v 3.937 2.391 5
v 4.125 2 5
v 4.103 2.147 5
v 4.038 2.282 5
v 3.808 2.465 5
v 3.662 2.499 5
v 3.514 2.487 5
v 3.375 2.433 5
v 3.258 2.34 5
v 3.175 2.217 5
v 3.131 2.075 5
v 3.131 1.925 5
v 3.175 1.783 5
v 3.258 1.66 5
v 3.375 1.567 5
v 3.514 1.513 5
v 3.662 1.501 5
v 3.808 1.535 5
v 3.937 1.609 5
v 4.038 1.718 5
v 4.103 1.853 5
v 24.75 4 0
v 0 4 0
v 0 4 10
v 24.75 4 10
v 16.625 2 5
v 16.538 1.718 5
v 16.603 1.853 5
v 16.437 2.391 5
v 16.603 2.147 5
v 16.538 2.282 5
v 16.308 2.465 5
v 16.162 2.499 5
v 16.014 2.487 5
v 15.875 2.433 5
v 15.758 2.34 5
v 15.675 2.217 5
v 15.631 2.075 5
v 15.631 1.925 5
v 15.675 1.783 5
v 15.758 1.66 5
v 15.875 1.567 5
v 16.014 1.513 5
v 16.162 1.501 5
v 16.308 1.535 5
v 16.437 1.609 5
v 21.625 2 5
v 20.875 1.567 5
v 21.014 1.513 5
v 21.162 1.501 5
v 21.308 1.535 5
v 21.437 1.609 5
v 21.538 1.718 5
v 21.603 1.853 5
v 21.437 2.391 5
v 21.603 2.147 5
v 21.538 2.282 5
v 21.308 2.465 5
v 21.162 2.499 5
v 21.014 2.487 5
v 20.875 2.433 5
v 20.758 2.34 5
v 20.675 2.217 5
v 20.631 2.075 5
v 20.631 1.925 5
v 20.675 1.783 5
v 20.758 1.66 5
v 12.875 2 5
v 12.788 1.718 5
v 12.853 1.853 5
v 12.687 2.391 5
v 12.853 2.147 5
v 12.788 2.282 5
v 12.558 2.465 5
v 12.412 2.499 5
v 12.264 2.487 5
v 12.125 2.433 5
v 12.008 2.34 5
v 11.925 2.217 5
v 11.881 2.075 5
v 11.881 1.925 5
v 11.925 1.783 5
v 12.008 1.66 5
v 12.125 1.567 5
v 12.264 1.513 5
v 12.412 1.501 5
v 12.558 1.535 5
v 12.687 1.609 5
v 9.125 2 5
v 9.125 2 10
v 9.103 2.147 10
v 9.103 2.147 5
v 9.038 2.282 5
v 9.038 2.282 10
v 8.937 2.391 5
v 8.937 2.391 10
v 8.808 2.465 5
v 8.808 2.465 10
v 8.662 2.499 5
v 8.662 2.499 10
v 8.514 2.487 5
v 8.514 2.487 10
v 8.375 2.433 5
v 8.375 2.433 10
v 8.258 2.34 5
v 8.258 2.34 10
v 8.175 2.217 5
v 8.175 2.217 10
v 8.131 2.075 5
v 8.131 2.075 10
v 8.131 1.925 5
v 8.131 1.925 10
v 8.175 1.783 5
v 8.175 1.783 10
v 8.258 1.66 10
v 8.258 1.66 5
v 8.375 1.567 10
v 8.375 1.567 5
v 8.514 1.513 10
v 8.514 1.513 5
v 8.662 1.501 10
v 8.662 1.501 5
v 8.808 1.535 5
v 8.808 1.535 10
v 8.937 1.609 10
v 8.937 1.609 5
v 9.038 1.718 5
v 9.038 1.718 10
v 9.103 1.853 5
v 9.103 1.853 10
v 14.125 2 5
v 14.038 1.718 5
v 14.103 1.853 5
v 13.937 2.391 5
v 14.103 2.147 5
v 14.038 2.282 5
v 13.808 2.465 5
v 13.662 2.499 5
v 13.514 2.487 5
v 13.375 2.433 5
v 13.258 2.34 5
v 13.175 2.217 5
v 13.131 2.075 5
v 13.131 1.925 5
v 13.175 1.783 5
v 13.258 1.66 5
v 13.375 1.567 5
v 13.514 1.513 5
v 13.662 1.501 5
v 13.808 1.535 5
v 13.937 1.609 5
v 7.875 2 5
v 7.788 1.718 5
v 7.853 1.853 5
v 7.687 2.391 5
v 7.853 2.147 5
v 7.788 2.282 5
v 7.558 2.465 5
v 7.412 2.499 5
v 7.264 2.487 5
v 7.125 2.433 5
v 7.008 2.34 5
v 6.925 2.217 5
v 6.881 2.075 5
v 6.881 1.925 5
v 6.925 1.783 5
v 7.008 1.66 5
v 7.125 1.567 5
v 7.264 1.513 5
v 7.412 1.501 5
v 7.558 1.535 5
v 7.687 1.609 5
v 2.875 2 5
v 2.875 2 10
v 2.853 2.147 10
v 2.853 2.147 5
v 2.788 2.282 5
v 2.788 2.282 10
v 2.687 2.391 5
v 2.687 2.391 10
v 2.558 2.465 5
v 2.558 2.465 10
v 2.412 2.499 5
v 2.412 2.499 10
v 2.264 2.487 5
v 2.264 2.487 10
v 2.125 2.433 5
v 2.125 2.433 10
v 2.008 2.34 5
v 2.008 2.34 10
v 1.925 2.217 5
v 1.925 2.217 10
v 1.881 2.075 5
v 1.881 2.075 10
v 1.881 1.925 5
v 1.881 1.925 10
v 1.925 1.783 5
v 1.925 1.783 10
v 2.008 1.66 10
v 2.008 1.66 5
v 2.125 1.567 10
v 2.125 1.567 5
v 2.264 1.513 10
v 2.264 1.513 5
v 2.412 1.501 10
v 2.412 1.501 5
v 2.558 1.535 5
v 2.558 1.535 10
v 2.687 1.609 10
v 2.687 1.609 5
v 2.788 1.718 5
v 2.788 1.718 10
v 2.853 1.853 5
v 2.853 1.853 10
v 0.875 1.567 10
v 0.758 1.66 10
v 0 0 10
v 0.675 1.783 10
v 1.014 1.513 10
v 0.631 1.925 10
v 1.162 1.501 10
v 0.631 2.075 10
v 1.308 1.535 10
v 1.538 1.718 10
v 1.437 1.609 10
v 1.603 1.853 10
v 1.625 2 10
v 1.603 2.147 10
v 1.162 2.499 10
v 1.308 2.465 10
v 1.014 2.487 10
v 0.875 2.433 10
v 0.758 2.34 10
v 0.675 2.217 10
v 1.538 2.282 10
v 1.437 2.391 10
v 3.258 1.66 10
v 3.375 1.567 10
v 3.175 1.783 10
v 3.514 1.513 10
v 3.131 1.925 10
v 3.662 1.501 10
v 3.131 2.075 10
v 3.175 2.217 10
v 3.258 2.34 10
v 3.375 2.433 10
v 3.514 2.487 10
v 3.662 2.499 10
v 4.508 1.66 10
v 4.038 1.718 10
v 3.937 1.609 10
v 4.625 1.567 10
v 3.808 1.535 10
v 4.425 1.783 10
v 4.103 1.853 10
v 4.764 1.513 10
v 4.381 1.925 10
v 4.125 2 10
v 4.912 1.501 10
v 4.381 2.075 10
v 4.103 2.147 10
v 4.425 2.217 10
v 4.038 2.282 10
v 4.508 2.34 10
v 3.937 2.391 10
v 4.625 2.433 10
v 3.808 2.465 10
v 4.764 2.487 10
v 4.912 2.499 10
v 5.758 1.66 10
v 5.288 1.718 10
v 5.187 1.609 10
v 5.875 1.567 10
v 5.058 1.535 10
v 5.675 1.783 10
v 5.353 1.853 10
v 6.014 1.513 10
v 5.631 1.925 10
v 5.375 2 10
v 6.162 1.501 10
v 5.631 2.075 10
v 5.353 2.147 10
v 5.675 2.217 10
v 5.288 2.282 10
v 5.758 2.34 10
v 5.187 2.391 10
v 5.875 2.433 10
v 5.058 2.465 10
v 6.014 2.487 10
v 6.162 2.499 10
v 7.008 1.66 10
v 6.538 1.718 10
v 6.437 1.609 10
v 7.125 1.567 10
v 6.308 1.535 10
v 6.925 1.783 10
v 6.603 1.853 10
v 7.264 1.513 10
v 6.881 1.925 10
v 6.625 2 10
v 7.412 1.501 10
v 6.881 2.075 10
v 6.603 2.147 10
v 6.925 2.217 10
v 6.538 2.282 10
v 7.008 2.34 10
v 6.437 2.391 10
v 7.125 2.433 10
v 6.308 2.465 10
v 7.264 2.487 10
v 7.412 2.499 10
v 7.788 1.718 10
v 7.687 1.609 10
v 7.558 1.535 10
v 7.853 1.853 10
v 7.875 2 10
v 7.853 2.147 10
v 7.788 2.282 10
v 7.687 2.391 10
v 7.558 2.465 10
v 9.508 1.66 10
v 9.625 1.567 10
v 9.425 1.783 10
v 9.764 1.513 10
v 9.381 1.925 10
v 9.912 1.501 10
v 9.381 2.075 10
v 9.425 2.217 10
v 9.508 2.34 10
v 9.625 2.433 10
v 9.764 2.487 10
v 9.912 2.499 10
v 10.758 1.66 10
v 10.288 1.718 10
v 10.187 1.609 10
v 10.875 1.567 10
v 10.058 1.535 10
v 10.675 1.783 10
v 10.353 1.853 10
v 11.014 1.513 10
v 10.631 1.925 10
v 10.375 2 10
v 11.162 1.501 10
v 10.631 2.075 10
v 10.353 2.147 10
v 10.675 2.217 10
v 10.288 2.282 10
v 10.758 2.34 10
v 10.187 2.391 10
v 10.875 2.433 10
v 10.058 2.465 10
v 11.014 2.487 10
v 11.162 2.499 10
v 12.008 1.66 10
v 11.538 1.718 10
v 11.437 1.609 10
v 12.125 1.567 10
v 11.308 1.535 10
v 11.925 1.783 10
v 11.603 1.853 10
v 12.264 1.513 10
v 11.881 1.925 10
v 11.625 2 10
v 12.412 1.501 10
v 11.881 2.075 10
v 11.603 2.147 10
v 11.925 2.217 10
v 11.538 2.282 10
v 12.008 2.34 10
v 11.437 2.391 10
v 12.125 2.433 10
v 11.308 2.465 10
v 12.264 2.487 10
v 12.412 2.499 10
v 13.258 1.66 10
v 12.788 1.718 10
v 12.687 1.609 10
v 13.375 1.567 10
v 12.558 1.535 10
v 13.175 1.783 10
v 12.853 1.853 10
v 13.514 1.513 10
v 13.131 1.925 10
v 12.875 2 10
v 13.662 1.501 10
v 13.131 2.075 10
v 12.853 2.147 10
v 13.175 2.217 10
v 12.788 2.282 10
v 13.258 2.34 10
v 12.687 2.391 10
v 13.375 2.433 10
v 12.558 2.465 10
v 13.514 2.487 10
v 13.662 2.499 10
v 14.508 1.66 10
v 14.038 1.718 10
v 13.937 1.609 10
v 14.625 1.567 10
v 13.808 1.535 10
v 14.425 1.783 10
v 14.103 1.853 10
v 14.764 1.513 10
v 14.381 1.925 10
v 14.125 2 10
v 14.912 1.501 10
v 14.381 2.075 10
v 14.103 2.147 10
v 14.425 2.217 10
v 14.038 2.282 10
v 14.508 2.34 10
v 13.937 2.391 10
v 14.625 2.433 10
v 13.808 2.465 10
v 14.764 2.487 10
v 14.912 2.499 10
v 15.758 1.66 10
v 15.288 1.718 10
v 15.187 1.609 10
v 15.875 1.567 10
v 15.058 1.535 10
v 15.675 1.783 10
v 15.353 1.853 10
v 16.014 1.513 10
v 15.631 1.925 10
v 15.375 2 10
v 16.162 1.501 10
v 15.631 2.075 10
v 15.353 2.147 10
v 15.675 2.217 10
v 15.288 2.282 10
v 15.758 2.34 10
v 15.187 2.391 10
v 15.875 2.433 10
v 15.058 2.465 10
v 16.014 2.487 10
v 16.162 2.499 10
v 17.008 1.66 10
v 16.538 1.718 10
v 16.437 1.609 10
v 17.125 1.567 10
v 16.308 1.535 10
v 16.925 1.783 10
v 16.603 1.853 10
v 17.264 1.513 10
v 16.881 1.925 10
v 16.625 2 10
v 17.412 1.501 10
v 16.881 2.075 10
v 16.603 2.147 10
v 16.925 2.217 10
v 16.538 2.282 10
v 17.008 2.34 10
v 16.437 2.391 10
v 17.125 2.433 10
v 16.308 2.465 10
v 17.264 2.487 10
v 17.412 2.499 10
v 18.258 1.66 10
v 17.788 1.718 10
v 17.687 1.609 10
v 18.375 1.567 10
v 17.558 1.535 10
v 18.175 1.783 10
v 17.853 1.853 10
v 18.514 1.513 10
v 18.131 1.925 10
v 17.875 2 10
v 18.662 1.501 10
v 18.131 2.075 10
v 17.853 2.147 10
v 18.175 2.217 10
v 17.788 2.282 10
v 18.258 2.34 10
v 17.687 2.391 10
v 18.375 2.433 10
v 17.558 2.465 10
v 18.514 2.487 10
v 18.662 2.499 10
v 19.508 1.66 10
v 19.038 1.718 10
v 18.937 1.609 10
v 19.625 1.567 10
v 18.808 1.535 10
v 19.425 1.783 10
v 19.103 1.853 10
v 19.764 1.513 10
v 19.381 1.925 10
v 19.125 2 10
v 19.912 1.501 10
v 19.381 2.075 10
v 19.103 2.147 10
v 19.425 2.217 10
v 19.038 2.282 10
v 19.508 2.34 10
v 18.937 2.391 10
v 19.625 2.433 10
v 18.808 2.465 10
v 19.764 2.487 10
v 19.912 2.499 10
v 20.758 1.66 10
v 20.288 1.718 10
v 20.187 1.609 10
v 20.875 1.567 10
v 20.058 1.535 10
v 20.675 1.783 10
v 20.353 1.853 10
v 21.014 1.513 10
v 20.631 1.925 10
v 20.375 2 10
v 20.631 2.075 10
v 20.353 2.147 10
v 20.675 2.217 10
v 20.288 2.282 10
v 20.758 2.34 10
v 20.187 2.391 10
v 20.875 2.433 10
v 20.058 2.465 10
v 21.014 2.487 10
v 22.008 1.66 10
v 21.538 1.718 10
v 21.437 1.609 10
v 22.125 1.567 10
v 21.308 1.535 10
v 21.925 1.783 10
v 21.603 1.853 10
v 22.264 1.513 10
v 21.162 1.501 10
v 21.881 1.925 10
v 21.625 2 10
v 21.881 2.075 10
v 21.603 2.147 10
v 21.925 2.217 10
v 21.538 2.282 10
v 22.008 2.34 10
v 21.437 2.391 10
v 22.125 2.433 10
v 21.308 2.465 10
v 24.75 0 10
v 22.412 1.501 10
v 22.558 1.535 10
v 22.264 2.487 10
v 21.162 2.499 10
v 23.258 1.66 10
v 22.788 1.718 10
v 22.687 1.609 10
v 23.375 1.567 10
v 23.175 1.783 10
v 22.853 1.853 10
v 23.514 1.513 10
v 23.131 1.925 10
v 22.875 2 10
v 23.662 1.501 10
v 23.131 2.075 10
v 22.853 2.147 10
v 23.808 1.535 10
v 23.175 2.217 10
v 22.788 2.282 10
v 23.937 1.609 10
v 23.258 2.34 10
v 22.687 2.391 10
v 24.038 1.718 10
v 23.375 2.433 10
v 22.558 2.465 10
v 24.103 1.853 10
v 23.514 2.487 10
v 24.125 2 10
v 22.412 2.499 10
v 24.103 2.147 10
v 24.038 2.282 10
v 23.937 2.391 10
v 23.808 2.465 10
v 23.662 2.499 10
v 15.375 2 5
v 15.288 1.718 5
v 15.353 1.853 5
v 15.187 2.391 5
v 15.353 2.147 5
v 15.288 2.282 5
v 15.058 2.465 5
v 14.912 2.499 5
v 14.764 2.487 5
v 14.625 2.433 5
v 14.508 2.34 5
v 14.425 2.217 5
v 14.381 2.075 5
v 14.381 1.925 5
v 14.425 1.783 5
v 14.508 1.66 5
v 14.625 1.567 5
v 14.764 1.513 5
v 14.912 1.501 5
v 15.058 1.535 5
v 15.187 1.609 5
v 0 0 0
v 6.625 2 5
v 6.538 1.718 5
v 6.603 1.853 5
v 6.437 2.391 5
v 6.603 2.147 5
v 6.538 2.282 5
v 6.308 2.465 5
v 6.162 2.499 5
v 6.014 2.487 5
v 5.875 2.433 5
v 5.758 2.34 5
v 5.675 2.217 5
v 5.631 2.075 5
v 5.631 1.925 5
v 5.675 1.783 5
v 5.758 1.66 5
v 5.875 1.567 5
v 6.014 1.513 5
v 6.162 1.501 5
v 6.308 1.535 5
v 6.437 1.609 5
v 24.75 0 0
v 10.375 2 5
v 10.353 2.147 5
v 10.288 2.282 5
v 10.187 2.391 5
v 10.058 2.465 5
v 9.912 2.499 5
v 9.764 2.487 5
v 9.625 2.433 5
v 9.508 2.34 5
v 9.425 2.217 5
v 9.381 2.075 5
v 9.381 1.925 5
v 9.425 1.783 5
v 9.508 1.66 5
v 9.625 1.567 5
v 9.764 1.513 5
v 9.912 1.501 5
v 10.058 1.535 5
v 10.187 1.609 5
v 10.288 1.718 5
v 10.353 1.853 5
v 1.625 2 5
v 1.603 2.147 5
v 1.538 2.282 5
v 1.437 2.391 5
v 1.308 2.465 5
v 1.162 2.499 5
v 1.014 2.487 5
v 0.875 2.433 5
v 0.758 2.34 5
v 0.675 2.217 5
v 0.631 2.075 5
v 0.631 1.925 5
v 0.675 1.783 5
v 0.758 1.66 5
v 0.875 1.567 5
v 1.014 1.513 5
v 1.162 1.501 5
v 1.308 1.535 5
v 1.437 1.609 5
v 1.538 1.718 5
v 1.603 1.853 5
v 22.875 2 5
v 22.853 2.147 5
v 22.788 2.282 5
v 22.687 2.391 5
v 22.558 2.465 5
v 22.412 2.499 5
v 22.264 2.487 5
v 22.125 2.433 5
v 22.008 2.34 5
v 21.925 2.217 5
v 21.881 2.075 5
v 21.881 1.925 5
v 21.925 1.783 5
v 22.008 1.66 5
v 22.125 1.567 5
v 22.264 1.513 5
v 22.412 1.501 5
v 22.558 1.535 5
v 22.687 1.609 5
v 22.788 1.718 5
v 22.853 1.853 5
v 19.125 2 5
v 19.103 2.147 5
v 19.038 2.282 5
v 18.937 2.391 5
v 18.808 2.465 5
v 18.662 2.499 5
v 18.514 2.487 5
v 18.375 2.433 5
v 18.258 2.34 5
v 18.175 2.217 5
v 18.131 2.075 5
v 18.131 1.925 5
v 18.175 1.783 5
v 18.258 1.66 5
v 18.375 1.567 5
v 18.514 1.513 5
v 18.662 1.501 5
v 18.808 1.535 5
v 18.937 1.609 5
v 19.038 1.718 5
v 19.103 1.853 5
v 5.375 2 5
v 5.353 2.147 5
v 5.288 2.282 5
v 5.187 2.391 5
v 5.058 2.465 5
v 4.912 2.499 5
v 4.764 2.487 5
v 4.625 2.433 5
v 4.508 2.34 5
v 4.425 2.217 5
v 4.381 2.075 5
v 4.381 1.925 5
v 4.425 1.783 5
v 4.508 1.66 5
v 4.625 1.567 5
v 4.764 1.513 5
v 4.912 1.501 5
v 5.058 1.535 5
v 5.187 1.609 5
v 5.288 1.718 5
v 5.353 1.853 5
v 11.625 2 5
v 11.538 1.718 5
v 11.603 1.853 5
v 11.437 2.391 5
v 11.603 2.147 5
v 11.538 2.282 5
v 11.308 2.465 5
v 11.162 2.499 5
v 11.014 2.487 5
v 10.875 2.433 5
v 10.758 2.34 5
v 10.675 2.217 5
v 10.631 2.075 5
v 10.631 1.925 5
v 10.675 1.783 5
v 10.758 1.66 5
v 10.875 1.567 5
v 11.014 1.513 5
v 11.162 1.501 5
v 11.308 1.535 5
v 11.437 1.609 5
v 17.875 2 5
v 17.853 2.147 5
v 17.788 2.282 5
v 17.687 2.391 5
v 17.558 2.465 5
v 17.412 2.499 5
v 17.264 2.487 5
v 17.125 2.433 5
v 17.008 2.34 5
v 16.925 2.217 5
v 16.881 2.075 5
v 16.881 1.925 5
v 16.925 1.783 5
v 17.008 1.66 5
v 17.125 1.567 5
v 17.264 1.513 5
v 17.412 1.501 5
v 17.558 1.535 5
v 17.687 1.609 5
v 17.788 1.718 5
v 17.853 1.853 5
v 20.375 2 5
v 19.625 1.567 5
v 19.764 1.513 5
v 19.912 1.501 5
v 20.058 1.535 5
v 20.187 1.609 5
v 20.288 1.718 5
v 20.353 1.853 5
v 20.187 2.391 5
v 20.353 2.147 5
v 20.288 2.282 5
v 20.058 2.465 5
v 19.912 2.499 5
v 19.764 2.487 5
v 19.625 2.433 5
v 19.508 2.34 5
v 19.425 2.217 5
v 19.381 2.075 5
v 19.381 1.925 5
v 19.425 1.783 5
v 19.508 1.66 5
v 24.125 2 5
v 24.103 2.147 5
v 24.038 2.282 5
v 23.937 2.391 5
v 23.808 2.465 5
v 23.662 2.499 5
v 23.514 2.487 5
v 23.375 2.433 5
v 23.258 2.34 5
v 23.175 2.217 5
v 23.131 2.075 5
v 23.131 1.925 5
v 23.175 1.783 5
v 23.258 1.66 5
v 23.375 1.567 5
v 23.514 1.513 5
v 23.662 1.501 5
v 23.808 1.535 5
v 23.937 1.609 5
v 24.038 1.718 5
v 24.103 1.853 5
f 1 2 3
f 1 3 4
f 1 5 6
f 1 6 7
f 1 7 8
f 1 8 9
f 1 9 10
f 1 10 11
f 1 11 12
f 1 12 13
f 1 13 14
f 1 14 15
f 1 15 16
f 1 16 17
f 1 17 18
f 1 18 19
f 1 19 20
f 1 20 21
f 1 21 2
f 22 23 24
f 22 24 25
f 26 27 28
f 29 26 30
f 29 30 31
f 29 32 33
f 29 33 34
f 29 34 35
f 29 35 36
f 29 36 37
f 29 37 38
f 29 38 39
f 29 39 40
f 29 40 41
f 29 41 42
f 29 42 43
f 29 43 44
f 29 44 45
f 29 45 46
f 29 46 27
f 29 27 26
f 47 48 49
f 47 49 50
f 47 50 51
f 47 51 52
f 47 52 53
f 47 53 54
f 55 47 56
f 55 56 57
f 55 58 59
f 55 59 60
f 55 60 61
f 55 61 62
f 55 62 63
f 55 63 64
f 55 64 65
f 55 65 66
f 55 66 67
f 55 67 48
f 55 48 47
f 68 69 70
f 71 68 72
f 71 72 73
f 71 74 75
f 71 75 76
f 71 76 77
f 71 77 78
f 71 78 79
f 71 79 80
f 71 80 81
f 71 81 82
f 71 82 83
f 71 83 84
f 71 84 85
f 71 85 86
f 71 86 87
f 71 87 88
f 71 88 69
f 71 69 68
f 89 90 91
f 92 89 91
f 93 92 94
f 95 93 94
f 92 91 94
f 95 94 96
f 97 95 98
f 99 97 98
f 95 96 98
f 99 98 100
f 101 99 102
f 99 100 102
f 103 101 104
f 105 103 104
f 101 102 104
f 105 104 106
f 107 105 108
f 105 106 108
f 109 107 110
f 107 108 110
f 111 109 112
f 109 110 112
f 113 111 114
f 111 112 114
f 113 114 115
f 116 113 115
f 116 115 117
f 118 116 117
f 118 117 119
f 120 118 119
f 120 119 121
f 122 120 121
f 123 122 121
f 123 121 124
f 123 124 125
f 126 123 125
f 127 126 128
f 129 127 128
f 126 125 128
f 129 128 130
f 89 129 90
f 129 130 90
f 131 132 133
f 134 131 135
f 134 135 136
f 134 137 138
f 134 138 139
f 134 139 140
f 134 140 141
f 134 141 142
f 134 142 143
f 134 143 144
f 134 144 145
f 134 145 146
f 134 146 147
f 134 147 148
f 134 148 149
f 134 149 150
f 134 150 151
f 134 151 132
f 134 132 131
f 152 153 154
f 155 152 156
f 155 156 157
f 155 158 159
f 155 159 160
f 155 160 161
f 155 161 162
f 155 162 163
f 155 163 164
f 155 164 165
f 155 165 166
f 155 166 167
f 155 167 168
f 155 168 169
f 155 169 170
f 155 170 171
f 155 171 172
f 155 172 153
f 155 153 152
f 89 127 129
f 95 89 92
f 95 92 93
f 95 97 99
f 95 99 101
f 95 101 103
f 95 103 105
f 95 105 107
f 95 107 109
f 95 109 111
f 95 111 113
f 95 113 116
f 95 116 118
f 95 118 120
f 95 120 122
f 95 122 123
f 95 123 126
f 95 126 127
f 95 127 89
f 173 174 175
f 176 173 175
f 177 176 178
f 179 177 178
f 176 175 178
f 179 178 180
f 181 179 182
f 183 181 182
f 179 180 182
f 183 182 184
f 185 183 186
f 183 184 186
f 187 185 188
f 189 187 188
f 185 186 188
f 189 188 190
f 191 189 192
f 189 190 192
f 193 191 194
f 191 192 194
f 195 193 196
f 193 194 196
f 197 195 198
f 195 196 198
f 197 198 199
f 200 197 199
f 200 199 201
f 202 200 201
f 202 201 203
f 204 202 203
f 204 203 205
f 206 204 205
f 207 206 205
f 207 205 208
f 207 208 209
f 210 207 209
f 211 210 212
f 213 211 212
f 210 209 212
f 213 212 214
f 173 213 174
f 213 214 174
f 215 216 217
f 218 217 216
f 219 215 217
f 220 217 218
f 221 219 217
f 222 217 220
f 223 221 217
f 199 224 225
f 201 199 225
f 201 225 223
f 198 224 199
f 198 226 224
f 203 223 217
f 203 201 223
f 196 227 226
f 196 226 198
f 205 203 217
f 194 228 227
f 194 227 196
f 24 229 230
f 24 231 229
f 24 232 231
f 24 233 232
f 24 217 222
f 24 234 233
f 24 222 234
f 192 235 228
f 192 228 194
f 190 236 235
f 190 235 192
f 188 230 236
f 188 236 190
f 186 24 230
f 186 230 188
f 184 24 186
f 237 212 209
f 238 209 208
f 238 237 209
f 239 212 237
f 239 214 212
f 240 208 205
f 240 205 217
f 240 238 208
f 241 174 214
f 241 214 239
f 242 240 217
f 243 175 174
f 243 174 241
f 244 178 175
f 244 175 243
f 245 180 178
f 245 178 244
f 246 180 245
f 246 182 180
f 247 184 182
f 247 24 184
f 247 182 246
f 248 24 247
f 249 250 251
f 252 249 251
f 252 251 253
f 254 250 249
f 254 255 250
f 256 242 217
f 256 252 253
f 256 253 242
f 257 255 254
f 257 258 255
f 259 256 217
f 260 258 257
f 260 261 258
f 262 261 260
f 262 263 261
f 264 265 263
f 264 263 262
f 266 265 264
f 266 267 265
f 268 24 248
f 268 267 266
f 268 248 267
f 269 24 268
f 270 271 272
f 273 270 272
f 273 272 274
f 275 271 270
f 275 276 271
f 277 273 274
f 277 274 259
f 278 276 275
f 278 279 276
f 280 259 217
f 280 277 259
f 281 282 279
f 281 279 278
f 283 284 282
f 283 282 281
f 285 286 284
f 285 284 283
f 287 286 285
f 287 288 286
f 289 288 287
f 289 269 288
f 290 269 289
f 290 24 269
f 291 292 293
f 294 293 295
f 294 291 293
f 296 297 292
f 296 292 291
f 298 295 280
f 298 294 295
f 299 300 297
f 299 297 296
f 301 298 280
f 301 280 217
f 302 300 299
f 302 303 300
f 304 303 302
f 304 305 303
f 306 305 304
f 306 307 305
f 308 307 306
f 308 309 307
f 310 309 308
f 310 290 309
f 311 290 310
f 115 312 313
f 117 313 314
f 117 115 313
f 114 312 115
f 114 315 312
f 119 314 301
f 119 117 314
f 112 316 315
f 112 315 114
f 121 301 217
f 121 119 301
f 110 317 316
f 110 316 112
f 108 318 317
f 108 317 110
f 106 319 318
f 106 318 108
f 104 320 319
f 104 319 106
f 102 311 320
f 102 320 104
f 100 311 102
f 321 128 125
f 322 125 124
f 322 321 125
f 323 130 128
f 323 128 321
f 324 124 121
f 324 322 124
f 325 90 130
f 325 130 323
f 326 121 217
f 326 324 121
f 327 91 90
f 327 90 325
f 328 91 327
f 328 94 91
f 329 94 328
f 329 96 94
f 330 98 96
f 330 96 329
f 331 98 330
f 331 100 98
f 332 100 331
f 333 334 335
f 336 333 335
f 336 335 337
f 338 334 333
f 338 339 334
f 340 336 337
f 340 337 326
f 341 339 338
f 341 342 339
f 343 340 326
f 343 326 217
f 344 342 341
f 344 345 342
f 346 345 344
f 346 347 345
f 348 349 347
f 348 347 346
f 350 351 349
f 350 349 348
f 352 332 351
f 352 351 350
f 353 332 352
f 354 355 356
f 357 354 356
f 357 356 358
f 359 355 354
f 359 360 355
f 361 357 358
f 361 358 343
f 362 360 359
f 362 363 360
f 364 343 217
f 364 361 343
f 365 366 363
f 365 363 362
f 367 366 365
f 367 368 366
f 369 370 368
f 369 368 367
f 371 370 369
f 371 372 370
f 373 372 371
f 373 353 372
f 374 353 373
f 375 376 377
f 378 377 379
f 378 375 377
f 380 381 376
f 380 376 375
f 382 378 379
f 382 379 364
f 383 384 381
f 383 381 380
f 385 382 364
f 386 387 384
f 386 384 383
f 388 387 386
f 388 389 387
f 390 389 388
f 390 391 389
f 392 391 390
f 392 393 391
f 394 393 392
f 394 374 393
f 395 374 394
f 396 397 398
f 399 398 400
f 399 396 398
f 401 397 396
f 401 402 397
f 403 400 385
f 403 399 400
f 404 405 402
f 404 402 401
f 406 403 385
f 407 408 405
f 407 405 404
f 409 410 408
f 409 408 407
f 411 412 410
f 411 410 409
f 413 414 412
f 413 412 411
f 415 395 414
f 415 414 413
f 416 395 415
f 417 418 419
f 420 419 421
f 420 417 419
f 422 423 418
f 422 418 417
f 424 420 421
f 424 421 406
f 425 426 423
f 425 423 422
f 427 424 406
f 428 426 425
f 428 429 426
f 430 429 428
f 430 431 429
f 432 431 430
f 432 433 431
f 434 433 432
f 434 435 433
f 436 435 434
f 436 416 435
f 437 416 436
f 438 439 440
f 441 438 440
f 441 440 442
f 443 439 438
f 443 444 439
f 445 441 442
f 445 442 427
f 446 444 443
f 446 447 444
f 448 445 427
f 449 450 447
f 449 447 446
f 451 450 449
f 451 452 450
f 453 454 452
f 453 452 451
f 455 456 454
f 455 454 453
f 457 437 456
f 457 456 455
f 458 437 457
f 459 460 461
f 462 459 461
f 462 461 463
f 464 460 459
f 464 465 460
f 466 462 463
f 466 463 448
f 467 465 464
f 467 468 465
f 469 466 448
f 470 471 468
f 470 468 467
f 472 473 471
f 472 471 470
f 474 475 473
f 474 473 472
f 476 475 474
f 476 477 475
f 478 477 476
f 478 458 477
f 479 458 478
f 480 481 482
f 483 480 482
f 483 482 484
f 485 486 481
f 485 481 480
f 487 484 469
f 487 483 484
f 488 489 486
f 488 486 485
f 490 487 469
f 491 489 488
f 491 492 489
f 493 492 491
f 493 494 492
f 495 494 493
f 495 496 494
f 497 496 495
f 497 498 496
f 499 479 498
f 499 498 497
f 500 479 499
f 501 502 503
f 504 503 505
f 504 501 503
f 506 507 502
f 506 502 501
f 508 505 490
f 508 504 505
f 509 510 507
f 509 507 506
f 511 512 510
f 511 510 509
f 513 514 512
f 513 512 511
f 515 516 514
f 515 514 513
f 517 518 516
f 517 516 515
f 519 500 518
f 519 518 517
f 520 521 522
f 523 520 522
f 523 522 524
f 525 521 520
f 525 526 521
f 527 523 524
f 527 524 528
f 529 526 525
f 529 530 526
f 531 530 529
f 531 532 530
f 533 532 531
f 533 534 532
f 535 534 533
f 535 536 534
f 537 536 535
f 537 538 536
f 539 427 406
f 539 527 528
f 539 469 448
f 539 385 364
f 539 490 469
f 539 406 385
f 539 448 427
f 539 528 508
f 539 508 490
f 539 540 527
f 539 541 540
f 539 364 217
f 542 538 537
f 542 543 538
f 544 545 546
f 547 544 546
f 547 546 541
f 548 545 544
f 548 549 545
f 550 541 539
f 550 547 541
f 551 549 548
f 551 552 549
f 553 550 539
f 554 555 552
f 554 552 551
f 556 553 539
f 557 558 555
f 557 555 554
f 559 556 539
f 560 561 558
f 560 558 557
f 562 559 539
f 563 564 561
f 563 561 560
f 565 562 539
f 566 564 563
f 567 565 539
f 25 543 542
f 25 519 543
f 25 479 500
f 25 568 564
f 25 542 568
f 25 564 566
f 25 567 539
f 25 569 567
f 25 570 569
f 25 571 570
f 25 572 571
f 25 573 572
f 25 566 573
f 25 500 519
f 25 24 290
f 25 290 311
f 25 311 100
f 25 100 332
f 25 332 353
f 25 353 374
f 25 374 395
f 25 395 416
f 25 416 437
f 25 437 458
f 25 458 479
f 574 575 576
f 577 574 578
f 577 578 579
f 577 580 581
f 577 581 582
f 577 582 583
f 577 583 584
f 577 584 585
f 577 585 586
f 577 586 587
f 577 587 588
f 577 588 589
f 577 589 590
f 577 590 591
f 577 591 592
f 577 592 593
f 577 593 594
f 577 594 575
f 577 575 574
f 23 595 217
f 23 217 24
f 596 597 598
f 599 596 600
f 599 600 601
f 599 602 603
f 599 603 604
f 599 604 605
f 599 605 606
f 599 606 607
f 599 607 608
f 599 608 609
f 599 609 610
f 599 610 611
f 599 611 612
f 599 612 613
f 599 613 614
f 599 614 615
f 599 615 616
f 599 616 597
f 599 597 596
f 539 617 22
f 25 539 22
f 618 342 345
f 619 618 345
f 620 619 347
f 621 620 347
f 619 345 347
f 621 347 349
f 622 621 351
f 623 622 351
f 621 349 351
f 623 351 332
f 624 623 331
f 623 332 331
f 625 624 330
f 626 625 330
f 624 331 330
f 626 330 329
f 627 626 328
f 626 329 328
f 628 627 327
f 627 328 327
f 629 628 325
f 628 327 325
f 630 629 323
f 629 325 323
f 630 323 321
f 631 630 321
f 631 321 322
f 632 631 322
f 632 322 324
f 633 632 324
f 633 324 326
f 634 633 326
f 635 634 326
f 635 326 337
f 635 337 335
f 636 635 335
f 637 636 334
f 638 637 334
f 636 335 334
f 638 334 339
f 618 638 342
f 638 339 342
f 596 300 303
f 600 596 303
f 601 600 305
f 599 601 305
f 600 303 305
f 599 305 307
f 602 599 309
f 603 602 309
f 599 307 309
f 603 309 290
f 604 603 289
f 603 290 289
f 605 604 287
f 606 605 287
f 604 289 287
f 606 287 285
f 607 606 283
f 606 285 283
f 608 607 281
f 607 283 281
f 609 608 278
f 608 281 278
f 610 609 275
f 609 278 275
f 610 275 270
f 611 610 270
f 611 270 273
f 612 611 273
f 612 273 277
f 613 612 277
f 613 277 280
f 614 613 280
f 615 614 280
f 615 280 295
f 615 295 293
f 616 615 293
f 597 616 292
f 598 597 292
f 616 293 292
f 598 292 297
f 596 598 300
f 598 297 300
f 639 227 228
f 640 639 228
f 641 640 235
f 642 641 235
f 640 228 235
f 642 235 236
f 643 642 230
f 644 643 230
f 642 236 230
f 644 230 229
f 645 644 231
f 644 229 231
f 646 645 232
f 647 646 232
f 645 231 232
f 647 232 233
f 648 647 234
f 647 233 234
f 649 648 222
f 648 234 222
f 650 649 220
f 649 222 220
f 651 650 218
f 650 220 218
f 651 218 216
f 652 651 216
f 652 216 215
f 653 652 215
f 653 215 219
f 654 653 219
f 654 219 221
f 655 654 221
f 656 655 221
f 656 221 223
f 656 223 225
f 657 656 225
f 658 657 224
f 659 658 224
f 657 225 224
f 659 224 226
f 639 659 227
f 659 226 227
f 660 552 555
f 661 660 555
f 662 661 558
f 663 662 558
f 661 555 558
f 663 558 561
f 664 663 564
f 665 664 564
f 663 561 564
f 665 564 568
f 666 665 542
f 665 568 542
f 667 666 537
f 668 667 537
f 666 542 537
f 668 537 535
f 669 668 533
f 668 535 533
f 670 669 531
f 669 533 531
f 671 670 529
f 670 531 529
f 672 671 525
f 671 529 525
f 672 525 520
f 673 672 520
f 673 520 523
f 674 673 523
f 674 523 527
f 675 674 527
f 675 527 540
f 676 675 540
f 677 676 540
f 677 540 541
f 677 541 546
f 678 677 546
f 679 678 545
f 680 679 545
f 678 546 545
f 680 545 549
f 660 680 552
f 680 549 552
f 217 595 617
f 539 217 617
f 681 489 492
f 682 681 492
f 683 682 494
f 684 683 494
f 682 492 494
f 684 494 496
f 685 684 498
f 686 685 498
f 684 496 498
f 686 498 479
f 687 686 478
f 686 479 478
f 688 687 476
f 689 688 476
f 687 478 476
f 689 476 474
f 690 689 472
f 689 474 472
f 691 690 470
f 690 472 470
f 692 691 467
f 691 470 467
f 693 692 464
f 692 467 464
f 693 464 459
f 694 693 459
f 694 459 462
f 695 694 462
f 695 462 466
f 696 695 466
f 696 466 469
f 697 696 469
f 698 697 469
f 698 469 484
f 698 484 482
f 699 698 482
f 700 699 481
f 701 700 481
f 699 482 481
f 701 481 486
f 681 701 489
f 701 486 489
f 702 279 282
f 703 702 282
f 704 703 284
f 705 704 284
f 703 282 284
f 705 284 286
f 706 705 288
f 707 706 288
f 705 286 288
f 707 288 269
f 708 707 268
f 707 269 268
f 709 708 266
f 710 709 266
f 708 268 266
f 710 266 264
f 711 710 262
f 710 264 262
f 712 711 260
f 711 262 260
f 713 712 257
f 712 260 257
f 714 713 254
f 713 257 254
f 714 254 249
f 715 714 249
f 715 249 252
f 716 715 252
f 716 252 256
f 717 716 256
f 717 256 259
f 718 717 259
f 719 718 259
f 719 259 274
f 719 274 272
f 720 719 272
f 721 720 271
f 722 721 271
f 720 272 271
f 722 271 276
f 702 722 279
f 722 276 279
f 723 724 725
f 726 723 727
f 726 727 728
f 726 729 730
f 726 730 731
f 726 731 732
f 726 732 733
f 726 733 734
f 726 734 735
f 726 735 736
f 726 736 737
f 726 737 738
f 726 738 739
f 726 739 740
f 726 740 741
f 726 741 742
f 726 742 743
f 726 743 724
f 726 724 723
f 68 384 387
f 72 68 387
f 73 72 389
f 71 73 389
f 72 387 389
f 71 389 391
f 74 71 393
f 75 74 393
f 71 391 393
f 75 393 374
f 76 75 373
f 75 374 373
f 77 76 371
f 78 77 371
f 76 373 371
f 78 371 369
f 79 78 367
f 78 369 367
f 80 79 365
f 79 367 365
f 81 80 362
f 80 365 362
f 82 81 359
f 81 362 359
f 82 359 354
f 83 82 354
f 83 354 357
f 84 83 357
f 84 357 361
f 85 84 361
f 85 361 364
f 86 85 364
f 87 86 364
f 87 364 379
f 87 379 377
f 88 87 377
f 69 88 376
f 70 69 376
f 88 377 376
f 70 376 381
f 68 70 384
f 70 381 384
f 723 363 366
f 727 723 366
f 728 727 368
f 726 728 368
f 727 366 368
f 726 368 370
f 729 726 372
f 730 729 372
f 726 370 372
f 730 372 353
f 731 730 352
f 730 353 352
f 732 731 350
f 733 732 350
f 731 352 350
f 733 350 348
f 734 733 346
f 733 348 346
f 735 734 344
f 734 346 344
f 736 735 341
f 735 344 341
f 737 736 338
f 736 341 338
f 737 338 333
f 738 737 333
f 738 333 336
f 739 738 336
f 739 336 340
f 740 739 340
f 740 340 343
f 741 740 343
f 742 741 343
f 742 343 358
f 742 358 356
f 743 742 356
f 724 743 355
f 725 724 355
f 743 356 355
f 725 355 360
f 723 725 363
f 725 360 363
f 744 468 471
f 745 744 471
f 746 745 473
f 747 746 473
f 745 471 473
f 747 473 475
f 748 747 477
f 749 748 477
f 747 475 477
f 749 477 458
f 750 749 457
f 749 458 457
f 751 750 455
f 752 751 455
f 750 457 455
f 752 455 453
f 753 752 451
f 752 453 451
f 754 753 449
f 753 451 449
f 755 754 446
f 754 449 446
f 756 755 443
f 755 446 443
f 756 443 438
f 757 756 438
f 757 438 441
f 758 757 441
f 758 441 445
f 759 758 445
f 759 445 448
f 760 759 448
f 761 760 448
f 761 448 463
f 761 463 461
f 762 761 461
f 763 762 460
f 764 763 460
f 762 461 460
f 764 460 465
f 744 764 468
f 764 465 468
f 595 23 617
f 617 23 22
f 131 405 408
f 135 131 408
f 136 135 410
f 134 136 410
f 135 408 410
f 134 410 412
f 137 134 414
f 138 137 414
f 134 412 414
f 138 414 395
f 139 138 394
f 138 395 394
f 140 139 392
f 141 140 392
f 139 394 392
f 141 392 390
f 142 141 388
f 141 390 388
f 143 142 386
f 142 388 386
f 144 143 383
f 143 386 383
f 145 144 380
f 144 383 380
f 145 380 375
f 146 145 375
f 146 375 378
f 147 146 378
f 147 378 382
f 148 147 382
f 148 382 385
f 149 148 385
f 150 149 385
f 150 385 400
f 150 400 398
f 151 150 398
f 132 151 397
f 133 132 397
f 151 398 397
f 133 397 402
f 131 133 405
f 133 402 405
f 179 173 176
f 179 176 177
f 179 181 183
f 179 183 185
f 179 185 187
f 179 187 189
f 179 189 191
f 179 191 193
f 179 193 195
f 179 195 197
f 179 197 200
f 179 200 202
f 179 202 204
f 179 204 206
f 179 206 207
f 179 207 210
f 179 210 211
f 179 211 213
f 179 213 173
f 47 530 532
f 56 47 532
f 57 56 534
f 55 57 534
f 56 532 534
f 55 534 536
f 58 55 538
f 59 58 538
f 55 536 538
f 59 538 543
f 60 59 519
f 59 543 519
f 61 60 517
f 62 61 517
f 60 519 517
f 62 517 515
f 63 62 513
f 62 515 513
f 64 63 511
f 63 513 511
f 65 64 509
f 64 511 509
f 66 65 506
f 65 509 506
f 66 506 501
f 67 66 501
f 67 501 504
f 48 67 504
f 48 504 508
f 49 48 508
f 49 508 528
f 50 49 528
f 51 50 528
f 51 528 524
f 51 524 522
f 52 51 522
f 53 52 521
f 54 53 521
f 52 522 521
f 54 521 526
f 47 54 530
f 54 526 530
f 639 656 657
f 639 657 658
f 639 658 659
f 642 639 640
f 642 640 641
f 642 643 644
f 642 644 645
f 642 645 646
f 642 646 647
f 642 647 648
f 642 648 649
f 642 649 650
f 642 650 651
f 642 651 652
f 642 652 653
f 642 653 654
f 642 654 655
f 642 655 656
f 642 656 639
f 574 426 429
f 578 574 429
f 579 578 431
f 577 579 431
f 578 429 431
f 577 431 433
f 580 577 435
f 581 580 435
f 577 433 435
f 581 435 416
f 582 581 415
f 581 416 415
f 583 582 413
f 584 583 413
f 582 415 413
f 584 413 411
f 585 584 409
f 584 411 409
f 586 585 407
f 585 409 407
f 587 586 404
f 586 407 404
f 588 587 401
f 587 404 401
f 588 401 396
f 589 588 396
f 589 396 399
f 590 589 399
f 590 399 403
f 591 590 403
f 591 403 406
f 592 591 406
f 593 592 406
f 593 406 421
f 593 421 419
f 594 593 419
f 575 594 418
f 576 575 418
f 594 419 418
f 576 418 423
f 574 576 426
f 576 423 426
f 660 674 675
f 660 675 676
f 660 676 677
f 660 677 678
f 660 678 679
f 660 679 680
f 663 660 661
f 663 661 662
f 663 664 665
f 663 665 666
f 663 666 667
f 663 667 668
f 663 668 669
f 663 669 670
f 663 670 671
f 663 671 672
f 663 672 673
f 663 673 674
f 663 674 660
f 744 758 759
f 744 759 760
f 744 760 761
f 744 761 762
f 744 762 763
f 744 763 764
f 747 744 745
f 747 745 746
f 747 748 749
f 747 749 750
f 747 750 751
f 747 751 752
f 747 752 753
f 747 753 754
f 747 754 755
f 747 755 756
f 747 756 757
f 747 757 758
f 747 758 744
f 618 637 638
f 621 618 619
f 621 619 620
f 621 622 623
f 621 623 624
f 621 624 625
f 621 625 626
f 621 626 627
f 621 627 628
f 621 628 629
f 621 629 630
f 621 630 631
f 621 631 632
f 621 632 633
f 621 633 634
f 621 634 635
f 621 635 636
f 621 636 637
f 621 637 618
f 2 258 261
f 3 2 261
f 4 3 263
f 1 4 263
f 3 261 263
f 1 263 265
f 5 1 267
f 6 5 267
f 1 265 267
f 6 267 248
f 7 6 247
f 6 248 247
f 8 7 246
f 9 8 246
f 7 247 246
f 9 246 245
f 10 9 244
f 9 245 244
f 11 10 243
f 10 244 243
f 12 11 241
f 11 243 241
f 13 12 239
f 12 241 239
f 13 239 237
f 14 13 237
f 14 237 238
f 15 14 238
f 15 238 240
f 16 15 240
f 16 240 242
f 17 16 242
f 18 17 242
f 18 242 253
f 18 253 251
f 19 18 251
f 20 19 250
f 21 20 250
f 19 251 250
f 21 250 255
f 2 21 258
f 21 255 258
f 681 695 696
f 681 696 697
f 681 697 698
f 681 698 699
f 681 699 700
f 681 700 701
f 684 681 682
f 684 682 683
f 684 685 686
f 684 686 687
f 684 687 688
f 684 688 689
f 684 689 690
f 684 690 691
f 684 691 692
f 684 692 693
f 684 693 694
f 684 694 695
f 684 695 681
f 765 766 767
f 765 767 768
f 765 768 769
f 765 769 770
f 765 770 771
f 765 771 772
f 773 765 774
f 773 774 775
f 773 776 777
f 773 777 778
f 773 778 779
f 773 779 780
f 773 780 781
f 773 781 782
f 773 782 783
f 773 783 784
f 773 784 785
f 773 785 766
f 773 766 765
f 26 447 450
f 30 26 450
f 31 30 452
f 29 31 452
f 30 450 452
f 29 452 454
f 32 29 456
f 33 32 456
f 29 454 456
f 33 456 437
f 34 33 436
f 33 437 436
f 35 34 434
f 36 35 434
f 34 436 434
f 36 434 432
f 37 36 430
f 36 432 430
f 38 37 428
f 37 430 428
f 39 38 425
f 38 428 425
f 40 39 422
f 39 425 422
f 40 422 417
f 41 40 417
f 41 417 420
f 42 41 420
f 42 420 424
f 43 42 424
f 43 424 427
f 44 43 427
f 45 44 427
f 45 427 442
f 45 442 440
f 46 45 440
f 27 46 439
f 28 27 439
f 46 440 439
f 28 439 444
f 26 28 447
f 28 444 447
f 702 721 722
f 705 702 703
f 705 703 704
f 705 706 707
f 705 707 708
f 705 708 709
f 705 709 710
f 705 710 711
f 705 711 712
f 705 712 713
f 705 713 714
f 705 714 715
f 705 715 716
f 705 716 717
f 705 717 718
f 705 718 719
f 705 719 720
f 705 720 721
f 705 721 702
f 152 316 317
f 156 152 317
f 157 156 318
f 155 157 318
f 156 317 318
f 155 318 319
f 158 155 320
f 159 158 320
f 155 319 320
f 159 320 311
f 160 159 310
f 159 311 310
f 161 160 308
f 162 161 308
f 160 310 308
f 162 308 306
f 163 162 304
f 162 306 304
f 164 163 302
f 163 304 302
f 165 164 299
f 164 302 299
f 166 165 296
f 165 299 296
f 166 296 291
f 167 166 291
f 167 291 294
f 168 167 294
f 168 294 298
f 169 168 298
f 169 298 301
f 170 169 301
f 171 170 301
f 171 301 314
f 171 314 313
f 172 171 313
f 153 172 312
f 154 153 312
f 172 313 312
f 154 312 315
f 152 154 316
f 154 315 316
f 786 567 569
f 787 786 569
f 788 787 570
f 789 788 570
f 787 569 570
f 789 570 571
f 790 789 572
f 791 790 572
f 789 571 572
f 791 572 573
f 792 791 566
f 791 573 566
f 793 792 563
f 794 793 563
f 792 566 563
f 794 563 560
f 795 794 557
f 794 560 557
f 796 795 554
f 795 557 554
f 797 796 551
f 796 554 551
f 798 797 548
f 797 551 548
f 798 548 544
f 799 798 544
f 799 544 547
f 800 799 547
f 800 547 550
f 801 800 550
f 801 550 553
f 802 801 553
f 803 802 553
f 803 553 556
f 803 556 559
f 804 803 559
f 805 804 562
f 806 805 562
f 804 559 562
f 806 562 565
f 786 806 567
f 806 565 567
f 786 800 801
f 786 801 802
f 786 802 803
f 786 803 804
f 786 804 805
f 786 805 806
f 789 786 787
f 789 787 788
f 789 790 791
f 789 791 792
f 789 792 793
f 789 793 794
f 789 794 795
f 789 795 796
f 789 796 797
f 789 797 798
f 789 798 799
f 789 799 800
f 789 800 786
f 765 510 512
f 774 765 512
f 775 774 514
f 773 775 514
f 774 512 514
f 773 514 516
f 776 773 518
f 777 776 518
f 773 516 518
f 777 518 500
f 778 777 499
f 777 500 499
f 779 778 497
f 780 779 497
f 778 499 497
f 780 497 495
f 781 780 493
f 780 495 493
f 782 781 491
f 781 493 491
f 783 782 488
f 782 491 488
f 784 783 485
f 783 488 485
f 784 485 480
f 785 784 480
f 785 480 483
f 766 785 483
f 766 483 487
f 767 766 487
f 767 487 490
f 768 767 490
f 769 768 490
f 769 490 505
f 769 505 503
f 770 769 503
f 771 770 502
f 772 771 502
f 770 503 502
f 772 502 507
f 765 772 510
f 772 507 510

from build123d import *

# Parameters (mm, degrees)
SKETCH2_W           = 24.75
SKETCH2_H           = 4
BOSS_EXTRUDE1_DEPTH = 10
SKETCH3_R           = 0.5
CUT_EXTRUDE1_DEPTH  = 5


with BuildPart() as part:
    # Sketch2 → Boss-Extrude1 (new body)
    with BuildSketch(Plane.XY):
        with Locations((12.375, 2)):
            Rectangle(SKETCH2_W, SKETCH2_H)
    extrude(amount=BOSS_EXTRUDE1_DEPTH)

    # Sketch3 → Cut-Extrude1 (cut)
    with BuildSketch(Plane.XY.offset(10)):
        with Locations((1.125, 2)):
            Circle(SKETCH3_R)
        with Locations((2.375, 2)):
            Circle(SKETCH3_R)
        with Locations((3.625, 2)):
            Circle(SKETCH3_R)
        with Locations((4.875, 2)):
            Circle(SKETCH3_R)
        with Locations((6.125, 2)):
            Circle(SKETCH3_R)
        with Locations((7.375, 2)):
            Circle(SKETCH3_R)
        with Locations((8.625, 2)):
            Circle(SKETCH3_R)
        with Locations((9.875, 2)):
            Circle(SKETCH3_R)
        with Locations((11.125, 2)):
            Circle(SKETCH3_R)
        with Locations((12.375, 2)):
            Circle(SKETCH3_R)
        with Locations((13.625, 2)):
            Circle(SKETCH3_R)
        with Locations((14.875, 2)):
            Circle(SKETCH3_R)
        with Locations((16.125, 2)):
            Circle(SKETCH3_R)
        with Locations((17.375, 2)):
            Circle(SKETCH3_R)
        with Locations((18.625, 2)):
            Circle(SKETCH3_R)
        with Locations((19.875, 2)):
            Circle(SKETCH3_R)
        with Locations((21.125, 2)):
            Circle(SKETCH3_R)
        with Locations((22.375, 2)):
            Circle(SKETCH3_R)
        with Locations((23.625, 2)):
            Circle(SKETCH3_R)
    extrude(amount=-CUT_EXTRUDE1_DEPTH, mode=Mode.SUBTRACT)


solid = part.part
